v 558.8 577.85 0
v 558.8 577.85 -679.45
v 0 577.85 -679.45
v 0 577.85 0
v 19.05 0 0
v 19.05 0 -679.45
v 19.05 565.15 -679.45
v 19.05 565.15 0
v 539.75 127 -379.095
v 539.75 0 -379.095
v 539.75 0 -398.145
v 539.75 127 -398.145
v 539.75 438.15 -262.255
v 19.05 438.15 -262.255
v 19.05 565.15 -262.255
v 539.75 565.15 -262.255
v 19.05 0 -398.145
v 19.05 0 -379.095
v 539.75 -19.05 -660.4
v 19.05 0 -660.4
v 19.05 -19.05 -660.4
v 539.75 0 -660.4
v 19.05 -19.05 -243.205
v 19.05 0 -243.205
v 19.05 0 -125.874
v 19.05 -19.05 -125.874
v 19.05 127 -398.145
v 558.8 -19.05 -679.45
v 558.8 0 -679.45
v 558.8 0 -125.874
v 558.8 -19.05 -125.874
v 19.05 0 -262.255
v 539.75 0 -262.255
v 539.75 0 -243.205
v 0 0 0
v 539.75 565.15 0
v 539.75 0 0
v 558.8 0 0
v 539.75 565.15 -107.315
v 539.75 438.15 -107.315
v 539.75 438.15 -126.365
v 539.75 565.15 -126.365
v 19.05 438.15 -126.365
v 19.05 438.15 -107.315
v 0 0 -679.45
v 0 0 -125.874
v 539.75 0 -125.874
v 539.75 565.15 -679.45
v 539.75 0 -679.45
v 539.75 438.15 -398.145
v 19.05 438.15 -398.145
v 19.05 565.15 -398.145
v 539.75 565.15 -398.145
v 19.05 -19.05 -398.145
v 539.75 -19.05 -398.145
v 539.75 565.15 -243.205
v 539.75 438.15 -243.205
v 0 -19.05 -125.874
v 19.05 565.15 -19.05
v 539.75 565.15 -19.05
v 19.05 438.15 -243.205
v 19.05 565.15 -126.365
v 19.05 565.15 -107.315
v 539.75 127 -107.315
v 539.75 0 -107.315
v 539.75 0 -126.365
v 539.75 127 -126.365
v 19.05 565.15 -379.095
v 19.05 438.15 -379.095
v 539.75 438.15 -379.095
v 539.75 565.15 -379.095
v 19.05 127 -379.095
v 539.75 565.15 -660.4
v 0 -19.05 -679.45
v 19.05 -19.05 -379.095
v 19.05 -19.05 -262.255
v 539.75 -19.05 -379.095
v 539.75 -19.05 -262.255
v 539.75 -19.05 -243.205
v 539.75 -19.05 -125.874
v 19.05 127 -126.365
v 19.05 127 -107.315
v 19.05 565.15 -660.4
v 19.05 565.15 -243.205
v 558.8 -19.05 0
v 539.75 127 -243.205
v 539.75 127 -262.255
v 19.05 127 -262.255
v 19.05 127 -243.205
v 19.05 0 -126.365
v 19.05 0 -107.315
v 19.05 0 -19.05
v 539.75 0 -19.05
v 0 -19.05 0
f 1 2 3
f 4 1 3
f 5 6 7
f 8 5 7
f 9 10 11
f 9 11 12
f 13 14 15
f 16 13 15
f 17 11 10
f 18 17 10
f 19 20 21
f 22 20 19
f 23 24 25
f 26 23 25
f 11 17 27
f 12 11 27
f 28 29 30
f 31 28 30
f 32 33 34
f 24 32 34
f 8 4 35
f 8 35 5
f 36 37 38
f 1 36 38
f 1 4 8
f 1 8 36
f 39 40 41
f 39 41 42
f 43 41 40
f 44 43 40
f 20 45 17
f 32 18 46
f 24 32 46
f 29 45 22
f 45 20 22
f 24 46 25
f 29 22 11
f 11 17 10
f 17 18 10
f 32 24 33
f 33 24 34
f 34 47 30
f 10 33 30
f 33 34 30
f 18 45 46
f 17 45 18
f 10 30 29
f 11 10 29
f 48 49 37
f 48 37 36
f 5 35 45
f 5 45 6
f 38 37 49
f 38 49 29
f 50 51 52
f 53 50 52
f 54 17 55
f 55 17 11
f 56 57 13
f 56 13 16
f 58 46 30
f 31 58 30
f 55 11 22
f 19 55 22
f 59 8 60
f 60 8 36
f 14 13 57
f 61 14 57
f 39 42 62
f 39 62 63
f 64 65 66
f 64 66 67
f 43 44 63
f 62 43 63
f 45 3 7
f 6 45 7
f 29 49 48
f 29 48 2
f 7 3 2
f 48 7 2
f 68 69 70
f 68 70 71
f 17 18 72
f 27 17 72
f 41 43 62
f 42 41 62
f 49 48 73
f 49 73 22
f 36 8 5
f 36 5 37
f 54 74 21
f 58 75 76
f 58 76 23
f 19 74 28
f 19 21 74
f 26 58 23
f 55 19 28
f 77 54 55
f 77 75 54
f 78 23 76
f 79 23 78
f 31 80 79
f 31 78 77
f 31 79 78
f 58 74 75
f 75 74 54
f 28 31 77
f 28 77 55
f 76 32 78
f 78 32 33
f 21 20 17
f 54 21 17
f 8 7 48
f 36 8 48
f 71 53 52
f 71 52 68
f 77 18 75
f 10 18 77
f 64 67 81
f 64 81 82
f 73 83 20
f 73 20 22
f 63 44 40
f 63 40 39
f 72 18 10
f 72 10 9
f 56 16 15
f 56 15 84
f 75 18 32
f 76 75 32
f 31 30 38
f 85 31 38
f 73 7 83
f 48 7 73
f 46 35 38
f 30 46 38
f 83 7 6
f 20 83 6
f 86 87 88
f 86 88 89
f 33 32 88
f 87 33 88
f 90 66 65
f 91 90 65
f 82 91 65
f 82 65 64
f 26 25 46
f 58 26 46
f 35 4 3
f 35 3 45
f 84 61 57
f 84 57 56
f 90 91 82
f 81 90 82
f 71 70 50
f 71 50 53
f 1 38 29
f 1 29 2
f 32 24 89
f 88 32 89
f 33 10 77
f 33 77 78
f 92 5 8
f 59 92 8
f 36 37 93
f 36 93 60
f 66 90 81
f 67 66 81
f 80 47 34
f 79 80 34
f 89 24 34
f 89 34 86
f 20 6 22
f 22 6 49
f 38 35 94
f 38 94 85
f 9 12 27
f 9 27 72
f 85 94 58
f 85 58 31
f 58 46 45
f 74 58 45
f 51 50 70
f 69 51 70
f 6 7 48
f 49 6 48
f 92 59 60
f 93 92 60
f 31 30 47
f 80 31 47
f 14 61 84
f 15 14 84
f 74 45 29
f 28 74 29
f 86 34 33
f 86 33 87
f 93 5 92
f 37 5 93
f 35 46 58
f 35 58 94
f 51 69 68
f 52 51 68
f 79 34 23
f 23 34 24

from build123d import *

# Parameters (mm, degrees)
F4_W      = 19.05
F4_H      = 565.15
F5_DEPTH  = 679.45
F6_W      = 520.7
F6_H      = 565.15
F7_DEPTH  = 19.05
F8_W      = 520.7
F8_H      = 565.15
F9_DEPTH  = 19.05
F10_W     = 558.8
F10_H     = 135.73125
F11_DEPTH = 19.05
F12_W     = 520.7
F12_H     = 19.05
F13_DEPTH = 565.15
F15_DEPTH = 19.05
F19_W     = 127
F19_H     = 19.05
F20_DEPTH = 520.7
F21_W     = 558.8
F21_H     = 125.8744746447
F22_DEPTH = 19.05
F23_W     = 263.5020315647
F23_H     = 73.9188790321
F24_DEPTH = 19.05
F25_W     = 520.7
F25_H     = 116.84
F25_H_2   = 19.05
F26_DEPTH = 19.05


# Not quite as in the source:
# - a variable given as a bare number and used for a length is read in inches; the dataset says mm whatever the document's units were


with BuildPart() as f5:
    # F4 (on Top) → F5 (new body)
    with BuildSketch(Plane.XY):
        Polygon((558.8, 577.85), (0, 577.85), (0, 565.15), (19.05, 565.15), (539.75, 565.15), (558.8, 565.15), align=None)
        with Locations((9.525, 282.575)):
            Rectangle(F4_W, F4_H)
        with Locations((549.275, 282.575)):
            Rectangle(F4_W, F4_H)
    extrude(amount=-F5_DEPTH)


with BuildPart() as f7:
    # F6 (on Top) → F7 (new body)
    with BuildSketch(Plane.XY):
        with Locations((279.4, 282.575)):
            Rectangle(F6_W, F6_H)
    extrude(amount=-F7_DEPTH)


with BuildPart() as f9:
    # F8 (on face) → F9 (new body)
    with BuildSketch(Plane(origin=(0, 0, -679.45), x_dir=(1, 0, 0), z_dir=(0, 0, -1))):
        with Locations((279.4, -282.575)):
            Rectangle(F8_W, F8_H)
    extrude(amount=-F9_DEPTH)


with BuildPart() as f11:
    # F10 (on face) → F11 (new body)
    with BuildSketch(Plane.XZ):
        with Locations((279.4, -67.865625)):
            Rectangle(F10_W, F10_H)
    extrude(amount=F11_DEPTH)


with BuildPart() as f13:
    # F12 (on face) → F13 (new body)
    with BuildSketch(Plane.XZ.offset(-565.15)):
        with Locations((279.4, -349.25)):
            Rectangle(F12_W, F12_H)
    extrude(amount=F13_DEPTH)


with BuildPart() as f15:
    # F14 (on face) → F15 (new body)
    with BuildSketch(Plane.XZ):
        Polygon((558.8, -135.73125), (539.75, -135.73125), (539.75, -339.725), (539.75, -358.775), (539.75, -660.4), (539.75, -679.45), (558.8, -679.45), align=None)
        Polygon((539.75, -358.775), (539.75, -339.725), (19.05, -339.725), (19.05, -135.73125), (0, -135.73125), (0, -679.45), (19.05, -679.45), (539.75, -679.45), (539.75, -660.4), (19.05, -660.4), (19.05, -358.775), align=None)
    extrude(amount=F15_DEPTH)


with BuildPart() as f20:
    # F19 (on face) → F20 (new body, through all)
    with BuildSketch(Plane.YZ.offset(19.05)):
        with Locations((501.65, -116.84)):
            Rectangle(F19_W, F19_H)
    extrude(amount=F20_DEPTH)


with BuildPart() as f20b:
    # F19 (on face) → F20, piece 2 (new body, through all)
    with BuildSketch(Plane.YZ.offset(19.05)):
        with Locations((63.5, -116.84)):
            Rectangle(F19_W, F19_H)
    extrude(amount=F20_DEPTH)


with BuildPart() as f20c:
    # F19 (on face) → F20, piece 3 (new body, through all)
    with BuildSketch(Plane.YZ.offset(19.05)):
        with Locations((63.5, -252.73)):
            Rectangle(F19_W, F19_H)
    extrude(amount=F20_DEPTH)


with BuildPart() as f20d:
    # F19 (on face) → F20, piece 4 (new body, through all)
    with BuildSketch(Plane.YZ.offset(19.05)):
        with Locations((501.65, -252.73)):
            Rectangle(F19_W, F19_H)
    extrude(amount=F20_DEPTH)


with BuildPart() as f20e:
    # F19 (on face) → F20, piece 5 (new body, through all)
    with BuildSketch(Plane.YZ.offset(19.05)):
        with Locations((63.5, -388.62)):
            Rectangle(F19_W, F19_H)
    extrude(amount=F20_DEPTH)


with BuildPart() as f20f:
    # F19 (on face) → F20, piece 6 (new body, through all)
    with BuildSketch(Plane.YZ.offset(19.05)):
        with Locations((501.65, -388.62)):
            Rectangle(F19_W, F19_H)
    extrude(amount=F20_DEPTH)


with BuildPart() as f22:
    # F21 (on Front) → F22 (new body)
    with BuildSketch(Plane.XZ):
        with Locations((279.4, -62.9372373223)):
            Rectangle(F21_W, F21_H)
    extrude(amount=F22_DEPTH)


with BuildPart() as f24:
    # F23 (on Front) → F24 (new body)
    with BuildSketch(Plane.XZ):
        with Locations((339.2337411642, -197.9473680258)):
            Rectangle(F23_W, F23_H)
    extrude(amount=F24_DEPTH)


with BuildPart() as f26:
    # F25 (on face) → F26 (new body)
    with BuildSketch(Plane.XZ):
        Polygon((19.05, -125.8744746447), (0, -125.8744746447), (0, -679.45), (19.05, -679.45), (19.05, -660.4), (19.05, -398.145), (539.75, -398.145), (539.75, -660.4), (539.75, -679.45), (558.8, -679.45), (558.8, -125.8744746447), (539.75, -125.8744746447), (539.75, -243.205), (19.05, -243.205), align=None)
        with Locations((279.4, -320.675)):
            Rectangle(F25_W, F25_H, mode=Mode.SUBTRACT)
        with Locations((279.4, -669.925)):
            Rectangle(F25_W, F25_H_2)
    extrude(amount=F26_DEPTH)


solid = Compound([f5.part, f7.part, f9.part, f20.part, f20b.part, f20c.part, f20d.part, f20e.part, f20f.part, f22.part, f26.part])
